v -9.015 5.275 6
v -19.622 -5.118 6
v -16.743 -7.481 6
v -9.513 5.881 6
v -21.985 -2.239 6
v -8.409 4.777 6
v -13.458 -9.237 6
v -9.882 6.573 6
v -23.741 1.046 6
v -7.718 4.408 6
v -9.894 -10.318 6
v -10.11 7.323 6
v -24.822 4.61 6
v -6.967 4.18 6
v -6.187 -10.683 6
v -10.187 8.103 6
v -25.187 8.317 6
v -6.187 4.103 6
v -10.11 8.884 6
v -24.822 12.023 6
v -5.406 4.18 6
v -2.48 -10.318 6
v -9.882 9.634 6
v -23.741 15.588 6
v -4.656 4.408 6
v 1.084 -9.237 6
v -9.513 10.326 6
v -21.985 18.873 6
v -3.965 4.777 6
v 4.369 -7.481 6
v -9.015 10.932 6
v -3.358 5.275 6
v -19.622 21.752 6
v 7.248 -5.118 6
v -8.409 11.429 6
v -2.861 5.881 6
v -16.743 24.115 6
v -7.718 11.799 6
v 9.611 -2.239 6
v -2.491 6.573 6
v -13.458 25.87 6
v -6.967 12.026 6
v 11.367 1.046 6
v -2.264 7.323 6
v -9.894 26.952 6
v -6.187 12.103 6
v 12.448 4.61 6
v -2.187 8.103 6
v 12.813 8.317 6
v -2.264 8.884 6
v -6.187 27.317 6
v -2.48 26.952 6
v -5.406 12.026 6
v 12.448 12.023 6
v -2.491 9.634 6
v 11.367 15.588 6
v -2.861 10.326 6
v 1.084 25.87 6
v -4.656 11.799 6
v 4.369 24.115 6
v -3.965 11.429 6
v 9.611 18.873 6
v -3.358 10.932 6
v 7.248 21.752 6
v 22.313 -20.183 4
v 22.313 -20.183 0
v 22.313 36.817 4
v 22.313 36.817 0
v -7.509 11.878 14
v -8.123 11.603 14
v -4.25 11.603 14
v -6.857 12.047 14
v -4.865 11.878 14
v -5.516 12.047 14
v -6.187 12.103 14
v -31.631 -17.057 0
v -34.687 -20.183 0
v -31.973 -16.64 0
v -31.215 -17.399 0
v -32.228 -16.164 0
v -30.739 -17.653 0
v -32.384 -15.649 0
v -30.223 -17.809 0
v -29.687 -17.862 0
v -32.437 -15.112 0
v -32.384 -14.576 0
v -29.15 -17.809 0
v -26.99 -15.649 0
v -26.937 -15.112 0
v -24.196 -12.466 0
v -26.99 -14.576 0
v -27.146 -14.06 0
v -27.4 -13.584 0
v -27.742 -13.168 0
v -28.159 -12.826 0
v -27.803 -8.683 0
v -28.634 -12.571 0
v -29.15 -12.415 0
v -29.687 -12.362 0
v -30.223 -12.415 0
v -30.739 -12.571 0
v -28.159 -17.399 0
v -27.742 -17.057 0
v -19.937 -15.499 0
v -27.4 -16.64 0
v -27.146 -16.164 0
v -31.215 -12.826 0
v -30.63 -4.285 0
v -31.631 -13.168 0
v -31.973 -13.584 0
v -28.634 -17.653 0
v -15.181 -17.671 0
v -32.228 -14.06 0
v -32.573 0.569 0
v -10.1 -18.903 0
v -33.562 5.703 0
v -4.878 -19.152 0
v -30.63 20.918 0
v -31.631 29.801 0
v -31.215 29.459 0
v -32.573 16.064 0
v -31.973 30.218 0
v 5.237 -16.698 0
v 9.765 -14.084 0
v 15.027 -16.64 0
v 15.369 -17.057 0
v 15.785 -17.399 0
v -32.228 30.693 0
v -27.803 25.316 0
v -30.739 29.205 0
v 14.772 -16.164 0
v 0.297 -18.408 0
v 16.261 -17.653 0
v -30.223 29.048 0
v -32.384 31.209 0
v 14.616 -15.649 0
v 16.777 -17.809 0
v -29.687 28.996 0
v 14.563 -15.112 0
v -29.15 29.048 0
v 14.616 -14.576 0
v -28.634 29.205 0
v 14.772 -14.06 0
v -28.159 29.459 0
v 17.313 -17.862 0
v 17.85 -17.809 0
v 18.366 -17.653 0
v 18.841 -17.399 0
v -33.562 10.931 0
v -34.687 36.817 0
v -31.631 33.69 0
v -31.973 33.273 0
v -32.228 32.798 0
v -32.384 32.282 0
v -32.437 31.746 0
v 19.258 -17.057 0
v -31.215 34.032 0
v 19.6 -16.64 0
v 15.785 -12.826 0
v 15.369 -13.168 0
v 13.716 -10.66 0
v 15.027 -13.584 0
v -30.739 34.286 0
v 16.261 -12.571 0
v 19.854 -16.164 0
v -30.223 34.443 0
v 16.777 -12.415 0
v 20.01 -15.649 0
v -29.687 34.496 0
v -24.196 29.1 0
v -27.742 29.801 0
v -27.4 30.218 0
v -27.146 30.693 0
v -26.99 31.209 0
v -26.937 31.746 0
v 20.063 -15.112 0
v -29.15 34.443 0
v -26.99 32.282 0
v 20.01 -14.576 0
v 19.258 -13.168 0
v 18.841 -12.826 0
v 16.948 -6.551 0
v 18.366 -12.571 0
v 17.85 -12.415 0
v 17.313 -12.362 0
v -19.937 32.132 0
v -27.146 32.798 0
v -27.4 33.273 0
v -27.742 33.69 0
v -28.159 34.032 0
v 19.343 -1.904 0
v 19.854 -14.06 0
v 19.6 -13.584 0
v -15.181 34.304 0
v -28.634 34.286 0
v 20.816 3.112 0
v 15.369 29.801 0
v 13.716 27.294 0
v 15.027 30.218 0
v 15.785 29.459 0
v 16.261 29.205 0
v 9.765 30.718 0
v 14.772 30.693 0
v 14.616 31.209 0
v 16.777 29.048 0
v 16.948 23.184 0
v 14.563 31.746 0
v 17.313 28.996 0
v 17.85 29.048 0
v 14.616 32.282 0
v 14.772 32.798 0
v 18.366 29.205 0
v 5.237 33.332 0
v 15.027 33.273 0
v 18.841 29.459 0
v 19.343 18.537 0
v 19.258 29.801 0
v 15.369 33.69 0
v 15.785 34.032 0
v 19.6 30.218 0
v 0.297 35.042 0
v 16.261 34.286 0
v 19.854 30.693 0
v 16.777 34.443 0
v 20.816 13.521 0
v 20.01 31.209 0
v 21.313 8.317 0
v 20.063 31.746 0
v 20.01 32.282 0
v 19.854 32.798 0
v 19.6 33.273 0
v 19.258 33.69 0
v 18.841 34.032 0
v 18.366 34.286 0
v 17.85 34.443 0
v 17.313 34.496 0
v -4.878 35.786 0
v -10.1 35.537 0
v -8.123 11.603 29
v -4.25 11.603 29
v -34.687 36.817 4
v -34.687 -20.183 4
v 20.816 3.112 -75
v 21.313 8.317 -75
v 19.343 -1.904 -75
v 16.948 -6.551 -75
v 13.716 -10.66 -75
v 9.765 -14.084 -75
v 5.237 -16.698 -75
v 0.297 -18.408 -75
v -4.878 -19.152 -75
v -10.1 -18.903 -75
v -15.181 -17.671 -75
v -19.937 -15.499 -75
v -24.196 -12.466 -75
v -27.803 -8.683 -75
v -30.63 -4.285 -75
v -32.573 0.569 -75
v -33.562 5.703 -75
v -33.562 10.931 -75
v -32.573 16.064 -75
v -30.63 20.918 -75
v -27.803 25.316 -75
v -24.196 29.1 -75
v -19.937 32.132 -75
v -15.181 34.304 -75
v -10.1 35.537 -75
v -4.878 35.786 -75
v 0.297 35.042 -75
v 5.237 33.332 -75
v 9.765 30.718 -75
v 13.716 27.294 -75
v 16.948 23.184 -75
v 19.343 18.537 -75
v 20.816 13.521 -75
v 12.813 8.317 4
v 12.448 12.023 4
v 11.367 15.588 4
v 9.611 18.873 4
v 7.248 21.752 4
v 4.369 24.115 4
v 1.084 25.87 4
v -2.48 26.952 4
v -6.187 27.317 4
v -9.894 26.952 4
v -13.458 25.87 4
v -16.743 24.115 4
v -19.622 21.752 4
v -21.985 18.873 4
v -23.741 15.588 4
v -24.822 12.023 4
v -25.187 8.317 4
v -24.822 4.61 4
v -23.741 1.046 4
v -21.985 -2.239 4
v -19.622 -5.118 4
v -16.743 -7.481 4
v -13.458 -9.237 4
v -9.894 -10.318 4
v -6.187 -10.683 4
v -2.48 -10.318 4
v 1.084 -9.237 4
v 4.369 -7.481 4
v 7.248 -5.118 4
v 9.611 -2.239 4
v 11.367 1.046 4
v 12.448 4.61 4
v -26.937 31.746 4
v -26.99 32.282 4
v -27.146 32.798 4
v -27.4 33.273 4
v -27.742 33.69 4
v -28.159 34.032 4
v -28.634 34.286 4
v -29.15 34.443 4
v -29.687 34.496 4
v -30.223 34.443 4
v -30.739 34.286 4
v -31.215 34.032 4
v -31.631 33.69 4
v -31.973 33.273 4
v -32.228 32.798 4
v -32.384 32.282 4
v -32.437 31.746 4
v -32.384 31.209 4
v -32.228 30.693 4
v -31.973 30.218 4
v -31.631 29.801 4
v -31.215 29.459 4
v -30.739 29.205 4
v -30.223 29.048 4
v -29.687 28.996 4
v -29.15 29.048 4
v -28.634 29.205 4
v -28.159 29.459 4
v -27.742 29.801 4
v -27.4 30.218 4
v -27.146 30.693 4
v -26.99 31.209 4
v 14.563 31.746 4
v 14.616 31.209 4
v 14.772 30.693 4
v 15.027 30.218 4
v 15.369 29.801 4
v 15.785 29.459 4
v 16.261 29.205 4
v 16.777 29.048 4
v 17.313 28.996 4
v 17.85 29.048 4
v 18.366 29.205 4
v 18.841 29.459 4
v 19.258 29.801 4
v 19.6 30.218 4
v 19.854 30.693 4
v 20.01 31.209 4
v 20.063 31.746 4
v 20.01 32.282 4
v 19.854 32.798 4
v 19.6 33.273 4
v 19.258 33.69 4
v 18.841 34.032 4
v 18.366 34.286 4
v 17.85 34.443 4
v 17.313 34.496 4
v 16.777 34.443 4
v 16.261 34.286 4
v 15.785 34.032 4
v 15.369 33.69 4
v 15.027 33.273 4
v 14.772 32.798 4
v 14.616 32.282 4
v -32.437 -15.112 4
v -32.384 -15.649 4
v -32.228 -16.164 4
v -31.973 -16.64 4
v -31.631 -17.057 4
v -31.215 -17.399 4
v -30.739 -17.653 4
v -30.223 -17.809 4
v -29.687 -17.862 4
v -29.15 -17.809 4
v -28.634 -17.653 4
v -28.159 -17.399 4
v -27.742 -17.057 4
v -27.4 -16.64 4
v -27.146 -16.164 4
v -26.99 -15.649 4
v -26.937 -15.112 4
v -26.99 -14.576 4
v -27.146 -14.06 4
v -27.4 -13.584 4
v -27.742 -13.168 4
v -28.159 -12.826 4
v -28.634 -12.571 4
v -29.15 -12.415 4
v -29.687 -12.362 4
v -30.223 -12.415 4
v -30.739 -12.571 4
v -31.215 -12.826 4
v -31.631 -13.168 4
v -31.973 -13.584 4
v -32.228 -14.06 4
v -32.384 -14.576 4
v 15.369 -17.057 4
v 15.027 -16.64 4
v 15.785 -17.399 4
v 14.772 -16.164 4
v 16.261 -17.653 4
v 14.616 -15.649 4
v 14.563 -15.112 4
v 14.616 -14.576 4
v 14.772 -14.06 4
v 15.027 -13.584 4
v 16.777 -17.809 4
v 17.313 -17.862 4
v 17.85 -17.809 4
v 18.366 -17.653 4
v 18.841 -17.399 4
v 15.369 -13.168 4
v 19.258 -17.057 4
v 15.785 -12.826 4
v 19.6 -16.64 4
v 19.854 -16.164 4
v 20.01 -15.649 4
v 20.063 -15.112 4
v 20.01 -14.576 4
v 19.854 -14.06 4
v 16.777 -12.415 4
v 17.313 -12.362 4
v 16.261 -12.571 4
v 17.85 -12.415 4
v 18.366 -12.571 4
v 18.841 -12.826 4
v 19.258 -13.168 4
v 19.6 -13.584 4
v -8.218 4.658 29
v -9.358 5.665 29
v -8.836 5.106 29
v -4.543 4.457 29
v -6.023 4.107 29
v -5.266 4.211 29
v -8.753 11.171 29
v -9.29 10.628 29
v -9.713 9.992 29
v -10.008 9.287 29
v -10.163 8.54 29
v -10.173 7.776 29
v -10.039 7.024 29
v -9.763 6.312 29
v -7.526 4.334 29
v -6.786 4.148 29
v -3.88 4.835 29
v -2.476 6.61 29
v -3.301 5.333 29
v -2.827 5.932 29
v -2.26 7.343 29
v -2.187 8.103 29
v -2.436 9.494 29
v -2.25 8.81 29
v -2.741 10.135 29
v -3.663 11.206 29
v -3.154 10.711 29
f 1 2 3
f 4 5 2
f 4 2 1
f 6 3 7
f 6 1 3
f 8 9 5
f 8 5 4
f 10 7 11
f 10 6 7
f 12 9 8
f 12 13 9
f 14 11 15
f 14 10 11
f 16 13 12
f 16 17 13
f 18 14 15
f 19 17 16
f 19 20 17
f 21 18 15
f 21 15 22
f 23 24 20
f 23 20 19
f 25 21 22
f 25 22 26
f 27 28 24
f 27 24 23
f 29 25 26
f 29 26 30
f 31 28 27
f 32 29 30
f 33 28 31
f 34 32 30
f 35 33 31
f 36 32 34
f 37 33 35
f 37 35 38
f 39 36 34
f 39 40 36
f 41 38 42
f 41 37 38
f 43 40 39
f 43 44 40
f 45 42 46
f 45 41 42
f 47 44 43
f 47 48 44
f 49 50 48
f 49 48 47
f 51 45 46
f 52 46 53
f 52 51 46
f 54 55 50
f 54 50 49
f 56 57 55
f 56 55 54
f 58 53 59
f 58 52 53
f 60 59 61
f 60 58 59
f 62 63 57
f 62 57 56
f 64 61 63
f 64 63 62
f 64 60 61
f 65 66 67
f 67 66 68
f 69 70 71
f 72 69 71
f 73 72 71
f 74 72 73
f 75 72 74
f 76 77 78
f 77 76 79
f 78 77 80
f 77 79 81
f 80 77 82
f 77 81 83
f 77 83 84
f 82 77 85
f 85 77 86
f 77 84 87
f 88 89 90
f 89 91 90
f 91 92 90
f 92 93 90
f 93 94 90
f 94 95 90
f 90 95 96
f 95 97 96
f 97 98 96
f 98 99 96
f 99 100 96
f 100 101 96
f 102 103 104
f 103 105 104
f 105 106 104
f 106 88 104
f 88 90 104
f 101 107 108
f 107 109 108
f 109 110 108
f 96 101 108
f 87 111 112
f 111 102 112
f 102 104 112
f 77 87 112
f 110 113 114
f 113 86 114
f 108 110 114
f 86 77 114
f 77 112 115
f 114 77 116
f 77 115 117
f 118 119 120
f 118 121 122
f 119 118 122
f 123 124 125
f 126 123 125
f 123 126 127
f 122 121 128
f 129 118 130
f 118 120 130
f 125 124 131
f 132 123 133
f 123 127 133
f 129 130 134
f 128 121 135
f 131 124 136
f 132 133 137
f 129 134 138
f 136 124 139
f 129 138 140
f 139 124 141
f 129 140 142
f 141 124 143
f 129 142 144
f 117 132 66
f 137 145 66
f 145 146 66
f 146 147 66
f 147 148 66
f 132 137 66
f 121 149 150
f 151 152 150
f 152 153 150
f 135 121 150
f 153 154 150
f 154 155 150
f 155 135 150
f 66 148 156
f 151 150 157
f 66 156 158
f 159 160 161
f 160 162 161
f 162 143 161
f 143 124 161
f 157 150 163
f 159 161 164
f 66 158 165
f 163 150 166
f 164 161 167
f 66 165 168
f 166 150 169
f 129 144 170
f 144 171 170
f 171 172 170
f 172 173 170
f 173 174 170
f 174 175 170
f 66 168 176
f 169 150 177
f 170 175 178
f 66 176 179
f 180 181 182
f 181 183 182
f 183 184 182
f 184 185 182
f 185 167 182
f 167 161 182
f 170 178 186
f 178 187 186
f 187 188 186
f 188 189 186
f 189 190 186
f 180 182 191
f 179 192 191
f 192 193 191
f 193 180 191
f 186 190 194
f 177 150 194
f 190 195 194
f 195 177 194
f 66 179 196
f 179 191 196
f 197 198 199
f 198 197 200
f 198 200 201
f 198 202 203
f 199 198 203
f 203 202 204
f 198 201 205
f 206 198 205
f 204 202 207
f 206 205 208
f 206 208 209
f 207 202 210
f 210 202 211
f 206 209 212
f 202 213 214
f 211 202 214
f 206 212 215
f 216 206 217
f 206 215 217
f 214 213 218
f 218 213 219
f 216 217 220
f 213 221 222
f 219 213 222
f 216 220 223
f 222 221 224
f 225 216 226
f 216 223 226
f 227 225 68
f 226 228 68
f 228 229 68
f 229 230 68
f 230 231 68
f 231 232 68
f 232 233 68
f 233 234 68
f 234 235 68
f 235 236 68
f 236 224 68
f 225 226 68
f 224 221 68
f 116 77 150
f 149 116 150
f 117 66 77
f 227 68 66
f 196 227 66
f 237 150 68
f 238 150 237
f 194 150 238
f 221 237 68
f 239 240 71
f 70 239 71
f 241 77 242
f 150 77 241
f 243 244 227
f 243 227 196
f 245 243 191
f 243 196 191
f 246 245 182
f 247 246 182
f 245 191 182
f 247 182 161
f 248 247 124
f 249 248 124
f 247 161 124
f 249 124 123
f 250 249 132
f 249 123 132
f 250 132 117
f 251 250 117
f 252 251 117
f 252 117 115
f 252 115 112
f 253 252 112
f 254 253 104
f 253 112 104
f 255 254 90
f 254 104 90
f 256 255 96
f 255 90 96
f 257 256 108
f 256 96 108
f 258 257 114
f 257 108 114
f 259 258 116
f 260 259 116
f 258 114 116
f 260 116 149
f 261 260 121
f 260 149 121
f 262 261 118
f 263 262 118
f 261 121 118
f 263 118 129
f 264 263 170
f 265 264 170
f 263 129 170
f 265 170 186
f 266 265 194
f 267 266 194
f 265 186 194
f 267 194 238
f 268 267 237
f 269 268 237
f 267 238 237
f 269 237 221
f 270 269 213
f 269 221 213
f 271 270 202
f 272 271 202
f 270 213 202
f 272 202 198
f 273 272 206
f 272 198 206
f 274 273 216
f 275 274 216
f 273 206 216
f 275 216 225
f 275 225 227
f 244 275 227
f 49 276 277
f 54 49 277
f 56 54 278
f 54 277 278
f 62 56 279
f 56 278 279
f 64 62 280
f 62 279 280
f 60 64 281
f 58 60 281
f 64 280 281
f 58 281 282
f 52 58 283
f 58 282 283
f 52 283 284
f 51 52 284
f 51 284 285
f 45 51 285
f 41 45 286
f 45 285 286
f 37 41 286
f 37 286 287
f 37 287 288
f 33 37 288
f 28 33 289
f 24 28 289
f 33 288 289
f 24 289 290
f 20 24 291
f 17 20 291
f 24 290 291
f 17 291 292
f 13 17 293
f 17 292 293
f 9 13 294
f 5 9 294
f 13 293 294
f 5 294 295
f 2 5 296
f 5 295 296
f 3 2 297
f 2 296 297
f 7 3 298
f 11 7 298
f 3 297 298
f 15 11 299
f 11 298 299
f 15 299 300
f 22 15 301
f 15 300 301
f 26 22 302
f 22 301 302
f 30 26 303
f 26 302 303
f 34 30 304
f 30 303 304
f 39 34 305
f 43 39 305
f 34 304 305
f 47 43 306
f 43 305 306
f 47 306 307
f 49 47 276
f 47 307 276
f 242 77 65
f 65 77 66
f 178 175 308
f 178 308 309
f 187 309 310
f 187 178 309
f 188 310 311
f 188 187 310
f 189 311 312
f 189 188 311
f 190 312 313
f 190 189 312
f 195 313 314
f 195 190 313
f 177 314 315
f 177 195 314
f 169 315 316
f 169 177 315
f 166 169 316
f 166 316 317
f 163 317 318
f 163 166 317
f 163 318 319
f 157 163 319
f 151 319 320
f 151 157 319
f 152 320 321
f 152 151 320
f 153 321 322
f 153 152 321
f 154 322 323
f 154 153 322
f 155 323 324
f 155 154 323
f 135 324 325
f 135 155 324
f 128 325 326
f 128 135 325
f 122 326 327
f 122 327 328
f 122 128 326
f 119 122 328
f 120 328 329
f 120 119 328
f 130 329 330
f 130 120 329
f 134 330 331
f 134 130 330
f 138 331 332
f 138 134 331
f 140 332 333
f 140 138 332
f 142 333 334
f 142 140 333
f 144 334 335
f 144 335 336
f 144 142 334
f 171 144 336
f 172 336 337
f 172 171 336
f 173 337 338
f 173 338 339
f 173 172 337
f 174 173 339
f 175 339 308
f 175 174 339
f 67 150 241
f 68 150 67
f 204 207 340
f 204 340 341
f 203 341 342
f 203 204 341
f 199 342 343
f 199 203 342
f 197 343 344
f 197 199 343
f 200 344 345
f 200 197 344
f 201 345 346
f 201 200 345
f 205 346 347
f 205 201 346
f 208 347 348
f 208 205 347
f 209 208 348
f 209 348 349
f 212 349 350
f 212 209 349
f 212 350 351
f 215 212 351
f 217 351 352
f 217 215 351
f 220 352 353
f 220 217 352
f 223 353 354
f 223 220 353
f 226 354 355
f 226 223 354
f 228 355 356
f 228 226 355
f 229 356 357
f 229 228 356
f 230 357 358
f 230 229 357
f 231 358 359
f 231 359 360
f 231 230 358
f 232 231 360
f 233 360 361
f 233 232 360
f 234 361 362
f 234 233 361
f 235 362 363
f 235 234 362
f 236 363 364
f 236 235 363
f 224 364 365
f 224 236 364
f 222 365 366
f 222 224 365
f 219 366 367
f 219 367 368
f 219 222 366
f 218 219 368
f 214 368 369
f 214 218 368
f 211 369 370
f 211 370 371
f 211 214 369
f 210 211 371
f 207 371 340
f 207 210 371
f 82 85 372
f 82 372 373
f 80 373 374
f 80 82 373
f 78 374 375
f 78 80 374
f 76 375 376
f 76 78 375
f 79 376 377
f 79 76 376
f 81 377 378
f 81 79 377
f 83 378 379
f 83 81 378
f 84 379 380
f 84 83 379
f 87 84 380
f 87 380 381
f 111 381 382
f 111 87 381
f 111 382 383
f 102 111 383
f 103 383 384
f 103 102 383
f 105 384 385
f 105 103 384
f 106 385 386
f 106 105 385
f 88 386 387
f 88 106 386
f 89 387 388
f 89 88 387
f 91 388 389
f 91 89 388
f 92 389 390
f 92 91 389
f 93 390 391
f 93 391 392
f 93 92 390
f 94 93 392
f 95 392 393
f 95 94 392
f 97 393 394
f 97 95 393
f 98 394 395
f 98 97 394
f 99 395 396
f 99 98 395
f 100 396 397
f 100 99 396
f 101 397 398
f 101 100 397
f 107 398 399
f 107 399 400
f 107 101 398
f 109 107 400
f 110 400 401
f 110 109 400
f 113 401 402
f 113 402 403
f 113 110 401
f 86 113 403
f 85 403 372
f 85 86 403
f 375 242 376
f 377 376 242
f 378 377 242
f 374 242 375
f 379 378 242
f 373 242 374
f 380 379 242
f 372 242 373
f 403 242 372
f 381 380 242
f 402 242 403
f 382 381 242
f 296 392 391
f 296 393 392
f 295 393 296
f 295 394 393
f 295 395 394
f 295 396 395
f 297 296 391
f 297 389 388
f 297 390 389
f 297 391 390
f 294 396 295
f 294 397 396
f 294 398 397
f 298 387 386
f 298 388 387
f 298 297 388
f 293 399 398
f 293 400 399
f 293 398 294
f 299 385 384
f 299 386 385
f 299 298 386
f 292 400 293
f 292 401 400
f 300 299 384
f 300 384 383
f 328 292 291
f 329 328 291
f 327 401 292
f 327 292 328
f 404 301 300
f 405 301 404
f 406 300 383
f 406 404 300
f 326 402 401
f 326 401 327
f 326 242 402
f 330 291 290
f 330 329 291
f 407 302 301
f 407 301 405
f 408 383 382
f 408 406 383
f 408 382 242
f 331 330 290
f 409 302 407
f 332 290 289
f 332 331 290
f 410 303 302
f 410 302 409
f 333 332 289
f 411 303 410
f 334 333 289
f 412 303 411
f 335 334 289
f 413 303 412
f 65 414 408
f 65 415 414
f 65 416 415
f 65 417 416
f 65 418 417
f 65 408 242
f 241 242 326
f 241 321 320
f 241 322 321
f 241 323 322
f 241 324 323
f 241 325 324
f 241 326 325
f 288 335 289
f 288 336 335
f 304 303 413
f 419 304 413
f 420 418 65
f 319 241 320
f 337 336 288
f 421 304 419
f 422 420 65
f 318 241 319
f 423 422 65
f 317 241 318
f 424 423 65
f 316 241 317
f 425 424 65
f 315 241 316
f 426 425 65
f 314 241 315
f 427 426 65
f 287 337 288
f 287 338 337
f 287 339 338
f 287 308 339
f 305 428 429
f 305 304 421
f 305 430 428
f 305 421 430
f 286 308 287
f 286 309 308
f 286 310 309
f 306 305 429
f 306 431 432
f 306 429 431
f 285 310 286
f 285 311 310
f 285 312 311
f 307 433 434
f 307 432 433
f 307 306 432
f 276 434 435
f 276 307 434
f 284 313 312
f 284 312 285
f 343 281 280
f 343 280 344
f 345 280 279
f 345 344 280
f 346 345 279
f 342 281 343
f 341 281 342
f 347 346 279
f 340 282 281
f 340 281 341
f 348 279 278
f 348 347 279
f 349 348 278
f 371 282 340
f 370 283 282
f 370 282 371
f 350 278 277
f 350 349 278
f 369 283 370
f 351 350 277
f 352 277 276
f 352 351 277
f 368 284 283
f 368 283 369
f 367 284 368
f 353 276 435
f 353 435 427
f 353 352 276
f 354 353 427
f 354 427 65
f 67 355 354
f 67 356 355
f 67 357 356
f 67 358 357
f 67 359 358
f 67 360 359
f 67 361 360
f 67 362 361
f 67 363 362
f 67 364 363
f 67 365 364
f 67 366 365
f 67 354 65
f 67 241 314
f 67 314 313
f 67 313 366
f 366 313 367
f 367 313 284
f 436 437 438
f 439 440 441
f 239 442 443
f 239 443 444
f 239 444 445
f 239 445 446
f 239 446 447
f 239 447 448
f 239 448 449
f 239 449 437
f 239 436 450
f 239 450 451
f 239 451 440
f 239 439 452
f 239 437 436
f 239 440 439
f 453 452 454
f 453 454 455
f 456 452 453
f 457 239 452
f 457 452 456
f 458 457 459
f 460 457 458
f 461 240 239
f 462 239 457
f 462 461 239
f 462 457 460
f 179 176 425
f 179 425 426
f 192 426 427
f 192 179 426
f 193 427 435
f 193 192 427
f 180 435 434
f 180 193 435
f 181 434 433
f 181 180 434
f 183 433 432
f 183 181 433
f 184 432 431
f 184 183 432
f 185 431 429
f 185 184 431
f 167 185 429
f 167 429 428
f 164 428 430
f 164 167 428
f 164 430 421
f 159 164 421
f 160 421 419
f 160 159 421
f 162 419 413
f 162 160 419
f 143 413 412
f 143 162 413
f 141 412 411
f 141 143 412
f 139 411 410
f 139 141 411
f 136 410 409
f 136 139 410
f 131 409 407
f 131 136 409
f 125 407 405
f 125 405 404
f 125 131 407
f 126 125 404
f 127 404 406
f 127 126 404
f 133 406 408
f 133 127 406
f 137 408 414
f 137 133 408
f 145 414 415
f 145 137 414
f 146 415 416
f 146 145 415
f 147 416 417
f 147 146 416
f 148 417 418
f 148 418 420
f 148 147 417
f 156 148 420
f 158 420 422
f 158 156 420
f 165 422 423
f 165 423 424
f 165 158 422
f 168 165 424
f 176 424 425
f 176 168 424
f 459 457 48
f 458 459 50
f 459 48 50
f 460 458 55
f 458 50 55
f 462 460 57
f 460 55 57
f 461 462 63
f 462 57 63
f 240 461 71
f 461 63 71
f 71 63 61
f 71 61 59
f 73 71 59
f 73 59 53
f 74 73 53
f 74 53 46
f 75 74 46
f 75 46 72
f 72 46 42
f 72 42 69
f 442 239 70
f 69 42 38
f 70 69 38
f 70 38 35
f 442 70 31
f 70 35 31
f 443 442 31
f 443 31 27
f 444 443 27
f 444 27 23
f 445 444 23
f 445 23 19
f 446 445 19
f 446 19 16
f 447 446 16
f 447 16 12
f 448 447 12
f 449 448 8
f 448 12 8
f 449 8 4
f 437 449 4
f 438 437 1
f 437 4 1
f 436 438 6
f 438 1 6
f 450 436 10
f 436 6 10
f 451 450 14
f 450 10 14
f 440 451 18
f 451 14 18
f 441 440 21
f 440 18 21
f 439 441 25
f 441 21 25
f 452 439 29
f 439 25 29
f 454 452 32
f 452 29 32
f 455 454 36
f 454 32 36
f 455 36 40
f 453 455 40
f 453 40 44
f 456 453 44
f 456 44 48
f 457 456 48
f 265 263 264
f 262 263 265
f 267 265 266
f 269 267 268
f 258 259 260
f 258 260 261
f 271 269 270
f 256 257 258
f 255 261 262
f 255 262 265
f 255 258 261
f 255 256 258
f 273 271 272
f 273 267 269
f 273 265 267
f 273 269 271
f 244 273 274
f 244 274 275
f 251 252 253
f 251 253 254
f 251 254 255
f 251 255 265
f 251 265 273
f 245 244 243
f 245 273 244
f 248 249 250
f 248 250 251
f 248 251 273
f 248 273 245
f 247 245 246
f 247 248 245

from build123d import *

# Parameters (mm, degrees)
SKETCH_1_W          = 57
SKETCH_1_H          = 57
SKETCH_1_R          = 2.75
EXTRUDE_1_DEPTH     = 4
SKETCH_2_R          = 27.5
EXTRUDE_2_DEPTH     = 75
SKETCH_3_R          = 19
EXTRUDE_3_DEPTH     = 2
SKETCH_4_R          = 4
EXTRUDE_4_DEPTH     = 23
SKETCH_5_W          = 15
SKETCH_5_H          = 0.5
CUT_EXTRUDE_1_DEPTH = 23


with BuildPart() as part:
    # 草图1 → 凸台-拉伸1 (new body)
    with BuildSketch(Plane.XY):
        with Locations((-6.18683274, 8.316725979)):
            Rectangle(SKETCH_1_W, SKETCH_1_H)
        with Locations((-29.68683274, 31.745551601)):
            Circle(SKETCH_1_R, mode=Mode.SUBTRACT)
        with Locations(Location((17.31316726, 31.745551601, 0), (0, 0, 180))):
            Circle(SKETCH_1_R, mode=Mode.SUBTRACT)
        with Locations((17.31316726, -15.112099644)):
            Circle(SKETCH_1_R, mode=Mode.SUBTRACT)
        with Locations(Location((-29.68683274, -15.112099644, 0), (0, 0, 180))):
            Circle(SKETCH_1_R, mode=Mode.SUBTRACT)
    extrude(amount=EXTRUDE_1_DEPTH)

    # 草图2 → 凸台-拉伸2 (add)
    with BuildSketch(Plane(origin=(0, 0, 0), x_dir=(-1, 0, 0), z_dir=(0, 0, -1))):
        with Locations(Location((6.18683274, 8.316725979, 0), (0, 0, 180))):
            Circle(SKETCH_2_R)
    extrude(amount=EXTRUDE_2_DEPTH)

    # 草图3 → 凸台-拉伸3 (add)
    with BuildSketch(Plane.XY.offset(4)):
        with Locations((-6.18683274, 8.316725979)):
            Circle(SKETCH_3_R)
    extrude(amount=EXTRUDE_3_DEPTH)

    # 草图4 → 凸台-拉伸4 (add)
    with BuildSketch(Plane.XY.offset(6)):
        with Locations((-6.18683274, 8.10325499)):
            Circle(SKETCH_4_R)
    extrude(amount=EXTRUDE_4_DEPTH)

    # 草图5 → 切除-拉伸1 (cut)
    with BuildSketch(Plane(origin=(-2.18683274, 0, 0), x_dir=(0, 0, -1), z_dir=(1, 0, 0))):
        with Locations((-21.5, 11.85325499)):
            Rectangle(SKETCH_5_W, SKETCH_5_H)
    extrude(amount=-CUT_EXTRUDE_1_DEPTH, mode=Mode.SUBTRACT)


solid = part.part
